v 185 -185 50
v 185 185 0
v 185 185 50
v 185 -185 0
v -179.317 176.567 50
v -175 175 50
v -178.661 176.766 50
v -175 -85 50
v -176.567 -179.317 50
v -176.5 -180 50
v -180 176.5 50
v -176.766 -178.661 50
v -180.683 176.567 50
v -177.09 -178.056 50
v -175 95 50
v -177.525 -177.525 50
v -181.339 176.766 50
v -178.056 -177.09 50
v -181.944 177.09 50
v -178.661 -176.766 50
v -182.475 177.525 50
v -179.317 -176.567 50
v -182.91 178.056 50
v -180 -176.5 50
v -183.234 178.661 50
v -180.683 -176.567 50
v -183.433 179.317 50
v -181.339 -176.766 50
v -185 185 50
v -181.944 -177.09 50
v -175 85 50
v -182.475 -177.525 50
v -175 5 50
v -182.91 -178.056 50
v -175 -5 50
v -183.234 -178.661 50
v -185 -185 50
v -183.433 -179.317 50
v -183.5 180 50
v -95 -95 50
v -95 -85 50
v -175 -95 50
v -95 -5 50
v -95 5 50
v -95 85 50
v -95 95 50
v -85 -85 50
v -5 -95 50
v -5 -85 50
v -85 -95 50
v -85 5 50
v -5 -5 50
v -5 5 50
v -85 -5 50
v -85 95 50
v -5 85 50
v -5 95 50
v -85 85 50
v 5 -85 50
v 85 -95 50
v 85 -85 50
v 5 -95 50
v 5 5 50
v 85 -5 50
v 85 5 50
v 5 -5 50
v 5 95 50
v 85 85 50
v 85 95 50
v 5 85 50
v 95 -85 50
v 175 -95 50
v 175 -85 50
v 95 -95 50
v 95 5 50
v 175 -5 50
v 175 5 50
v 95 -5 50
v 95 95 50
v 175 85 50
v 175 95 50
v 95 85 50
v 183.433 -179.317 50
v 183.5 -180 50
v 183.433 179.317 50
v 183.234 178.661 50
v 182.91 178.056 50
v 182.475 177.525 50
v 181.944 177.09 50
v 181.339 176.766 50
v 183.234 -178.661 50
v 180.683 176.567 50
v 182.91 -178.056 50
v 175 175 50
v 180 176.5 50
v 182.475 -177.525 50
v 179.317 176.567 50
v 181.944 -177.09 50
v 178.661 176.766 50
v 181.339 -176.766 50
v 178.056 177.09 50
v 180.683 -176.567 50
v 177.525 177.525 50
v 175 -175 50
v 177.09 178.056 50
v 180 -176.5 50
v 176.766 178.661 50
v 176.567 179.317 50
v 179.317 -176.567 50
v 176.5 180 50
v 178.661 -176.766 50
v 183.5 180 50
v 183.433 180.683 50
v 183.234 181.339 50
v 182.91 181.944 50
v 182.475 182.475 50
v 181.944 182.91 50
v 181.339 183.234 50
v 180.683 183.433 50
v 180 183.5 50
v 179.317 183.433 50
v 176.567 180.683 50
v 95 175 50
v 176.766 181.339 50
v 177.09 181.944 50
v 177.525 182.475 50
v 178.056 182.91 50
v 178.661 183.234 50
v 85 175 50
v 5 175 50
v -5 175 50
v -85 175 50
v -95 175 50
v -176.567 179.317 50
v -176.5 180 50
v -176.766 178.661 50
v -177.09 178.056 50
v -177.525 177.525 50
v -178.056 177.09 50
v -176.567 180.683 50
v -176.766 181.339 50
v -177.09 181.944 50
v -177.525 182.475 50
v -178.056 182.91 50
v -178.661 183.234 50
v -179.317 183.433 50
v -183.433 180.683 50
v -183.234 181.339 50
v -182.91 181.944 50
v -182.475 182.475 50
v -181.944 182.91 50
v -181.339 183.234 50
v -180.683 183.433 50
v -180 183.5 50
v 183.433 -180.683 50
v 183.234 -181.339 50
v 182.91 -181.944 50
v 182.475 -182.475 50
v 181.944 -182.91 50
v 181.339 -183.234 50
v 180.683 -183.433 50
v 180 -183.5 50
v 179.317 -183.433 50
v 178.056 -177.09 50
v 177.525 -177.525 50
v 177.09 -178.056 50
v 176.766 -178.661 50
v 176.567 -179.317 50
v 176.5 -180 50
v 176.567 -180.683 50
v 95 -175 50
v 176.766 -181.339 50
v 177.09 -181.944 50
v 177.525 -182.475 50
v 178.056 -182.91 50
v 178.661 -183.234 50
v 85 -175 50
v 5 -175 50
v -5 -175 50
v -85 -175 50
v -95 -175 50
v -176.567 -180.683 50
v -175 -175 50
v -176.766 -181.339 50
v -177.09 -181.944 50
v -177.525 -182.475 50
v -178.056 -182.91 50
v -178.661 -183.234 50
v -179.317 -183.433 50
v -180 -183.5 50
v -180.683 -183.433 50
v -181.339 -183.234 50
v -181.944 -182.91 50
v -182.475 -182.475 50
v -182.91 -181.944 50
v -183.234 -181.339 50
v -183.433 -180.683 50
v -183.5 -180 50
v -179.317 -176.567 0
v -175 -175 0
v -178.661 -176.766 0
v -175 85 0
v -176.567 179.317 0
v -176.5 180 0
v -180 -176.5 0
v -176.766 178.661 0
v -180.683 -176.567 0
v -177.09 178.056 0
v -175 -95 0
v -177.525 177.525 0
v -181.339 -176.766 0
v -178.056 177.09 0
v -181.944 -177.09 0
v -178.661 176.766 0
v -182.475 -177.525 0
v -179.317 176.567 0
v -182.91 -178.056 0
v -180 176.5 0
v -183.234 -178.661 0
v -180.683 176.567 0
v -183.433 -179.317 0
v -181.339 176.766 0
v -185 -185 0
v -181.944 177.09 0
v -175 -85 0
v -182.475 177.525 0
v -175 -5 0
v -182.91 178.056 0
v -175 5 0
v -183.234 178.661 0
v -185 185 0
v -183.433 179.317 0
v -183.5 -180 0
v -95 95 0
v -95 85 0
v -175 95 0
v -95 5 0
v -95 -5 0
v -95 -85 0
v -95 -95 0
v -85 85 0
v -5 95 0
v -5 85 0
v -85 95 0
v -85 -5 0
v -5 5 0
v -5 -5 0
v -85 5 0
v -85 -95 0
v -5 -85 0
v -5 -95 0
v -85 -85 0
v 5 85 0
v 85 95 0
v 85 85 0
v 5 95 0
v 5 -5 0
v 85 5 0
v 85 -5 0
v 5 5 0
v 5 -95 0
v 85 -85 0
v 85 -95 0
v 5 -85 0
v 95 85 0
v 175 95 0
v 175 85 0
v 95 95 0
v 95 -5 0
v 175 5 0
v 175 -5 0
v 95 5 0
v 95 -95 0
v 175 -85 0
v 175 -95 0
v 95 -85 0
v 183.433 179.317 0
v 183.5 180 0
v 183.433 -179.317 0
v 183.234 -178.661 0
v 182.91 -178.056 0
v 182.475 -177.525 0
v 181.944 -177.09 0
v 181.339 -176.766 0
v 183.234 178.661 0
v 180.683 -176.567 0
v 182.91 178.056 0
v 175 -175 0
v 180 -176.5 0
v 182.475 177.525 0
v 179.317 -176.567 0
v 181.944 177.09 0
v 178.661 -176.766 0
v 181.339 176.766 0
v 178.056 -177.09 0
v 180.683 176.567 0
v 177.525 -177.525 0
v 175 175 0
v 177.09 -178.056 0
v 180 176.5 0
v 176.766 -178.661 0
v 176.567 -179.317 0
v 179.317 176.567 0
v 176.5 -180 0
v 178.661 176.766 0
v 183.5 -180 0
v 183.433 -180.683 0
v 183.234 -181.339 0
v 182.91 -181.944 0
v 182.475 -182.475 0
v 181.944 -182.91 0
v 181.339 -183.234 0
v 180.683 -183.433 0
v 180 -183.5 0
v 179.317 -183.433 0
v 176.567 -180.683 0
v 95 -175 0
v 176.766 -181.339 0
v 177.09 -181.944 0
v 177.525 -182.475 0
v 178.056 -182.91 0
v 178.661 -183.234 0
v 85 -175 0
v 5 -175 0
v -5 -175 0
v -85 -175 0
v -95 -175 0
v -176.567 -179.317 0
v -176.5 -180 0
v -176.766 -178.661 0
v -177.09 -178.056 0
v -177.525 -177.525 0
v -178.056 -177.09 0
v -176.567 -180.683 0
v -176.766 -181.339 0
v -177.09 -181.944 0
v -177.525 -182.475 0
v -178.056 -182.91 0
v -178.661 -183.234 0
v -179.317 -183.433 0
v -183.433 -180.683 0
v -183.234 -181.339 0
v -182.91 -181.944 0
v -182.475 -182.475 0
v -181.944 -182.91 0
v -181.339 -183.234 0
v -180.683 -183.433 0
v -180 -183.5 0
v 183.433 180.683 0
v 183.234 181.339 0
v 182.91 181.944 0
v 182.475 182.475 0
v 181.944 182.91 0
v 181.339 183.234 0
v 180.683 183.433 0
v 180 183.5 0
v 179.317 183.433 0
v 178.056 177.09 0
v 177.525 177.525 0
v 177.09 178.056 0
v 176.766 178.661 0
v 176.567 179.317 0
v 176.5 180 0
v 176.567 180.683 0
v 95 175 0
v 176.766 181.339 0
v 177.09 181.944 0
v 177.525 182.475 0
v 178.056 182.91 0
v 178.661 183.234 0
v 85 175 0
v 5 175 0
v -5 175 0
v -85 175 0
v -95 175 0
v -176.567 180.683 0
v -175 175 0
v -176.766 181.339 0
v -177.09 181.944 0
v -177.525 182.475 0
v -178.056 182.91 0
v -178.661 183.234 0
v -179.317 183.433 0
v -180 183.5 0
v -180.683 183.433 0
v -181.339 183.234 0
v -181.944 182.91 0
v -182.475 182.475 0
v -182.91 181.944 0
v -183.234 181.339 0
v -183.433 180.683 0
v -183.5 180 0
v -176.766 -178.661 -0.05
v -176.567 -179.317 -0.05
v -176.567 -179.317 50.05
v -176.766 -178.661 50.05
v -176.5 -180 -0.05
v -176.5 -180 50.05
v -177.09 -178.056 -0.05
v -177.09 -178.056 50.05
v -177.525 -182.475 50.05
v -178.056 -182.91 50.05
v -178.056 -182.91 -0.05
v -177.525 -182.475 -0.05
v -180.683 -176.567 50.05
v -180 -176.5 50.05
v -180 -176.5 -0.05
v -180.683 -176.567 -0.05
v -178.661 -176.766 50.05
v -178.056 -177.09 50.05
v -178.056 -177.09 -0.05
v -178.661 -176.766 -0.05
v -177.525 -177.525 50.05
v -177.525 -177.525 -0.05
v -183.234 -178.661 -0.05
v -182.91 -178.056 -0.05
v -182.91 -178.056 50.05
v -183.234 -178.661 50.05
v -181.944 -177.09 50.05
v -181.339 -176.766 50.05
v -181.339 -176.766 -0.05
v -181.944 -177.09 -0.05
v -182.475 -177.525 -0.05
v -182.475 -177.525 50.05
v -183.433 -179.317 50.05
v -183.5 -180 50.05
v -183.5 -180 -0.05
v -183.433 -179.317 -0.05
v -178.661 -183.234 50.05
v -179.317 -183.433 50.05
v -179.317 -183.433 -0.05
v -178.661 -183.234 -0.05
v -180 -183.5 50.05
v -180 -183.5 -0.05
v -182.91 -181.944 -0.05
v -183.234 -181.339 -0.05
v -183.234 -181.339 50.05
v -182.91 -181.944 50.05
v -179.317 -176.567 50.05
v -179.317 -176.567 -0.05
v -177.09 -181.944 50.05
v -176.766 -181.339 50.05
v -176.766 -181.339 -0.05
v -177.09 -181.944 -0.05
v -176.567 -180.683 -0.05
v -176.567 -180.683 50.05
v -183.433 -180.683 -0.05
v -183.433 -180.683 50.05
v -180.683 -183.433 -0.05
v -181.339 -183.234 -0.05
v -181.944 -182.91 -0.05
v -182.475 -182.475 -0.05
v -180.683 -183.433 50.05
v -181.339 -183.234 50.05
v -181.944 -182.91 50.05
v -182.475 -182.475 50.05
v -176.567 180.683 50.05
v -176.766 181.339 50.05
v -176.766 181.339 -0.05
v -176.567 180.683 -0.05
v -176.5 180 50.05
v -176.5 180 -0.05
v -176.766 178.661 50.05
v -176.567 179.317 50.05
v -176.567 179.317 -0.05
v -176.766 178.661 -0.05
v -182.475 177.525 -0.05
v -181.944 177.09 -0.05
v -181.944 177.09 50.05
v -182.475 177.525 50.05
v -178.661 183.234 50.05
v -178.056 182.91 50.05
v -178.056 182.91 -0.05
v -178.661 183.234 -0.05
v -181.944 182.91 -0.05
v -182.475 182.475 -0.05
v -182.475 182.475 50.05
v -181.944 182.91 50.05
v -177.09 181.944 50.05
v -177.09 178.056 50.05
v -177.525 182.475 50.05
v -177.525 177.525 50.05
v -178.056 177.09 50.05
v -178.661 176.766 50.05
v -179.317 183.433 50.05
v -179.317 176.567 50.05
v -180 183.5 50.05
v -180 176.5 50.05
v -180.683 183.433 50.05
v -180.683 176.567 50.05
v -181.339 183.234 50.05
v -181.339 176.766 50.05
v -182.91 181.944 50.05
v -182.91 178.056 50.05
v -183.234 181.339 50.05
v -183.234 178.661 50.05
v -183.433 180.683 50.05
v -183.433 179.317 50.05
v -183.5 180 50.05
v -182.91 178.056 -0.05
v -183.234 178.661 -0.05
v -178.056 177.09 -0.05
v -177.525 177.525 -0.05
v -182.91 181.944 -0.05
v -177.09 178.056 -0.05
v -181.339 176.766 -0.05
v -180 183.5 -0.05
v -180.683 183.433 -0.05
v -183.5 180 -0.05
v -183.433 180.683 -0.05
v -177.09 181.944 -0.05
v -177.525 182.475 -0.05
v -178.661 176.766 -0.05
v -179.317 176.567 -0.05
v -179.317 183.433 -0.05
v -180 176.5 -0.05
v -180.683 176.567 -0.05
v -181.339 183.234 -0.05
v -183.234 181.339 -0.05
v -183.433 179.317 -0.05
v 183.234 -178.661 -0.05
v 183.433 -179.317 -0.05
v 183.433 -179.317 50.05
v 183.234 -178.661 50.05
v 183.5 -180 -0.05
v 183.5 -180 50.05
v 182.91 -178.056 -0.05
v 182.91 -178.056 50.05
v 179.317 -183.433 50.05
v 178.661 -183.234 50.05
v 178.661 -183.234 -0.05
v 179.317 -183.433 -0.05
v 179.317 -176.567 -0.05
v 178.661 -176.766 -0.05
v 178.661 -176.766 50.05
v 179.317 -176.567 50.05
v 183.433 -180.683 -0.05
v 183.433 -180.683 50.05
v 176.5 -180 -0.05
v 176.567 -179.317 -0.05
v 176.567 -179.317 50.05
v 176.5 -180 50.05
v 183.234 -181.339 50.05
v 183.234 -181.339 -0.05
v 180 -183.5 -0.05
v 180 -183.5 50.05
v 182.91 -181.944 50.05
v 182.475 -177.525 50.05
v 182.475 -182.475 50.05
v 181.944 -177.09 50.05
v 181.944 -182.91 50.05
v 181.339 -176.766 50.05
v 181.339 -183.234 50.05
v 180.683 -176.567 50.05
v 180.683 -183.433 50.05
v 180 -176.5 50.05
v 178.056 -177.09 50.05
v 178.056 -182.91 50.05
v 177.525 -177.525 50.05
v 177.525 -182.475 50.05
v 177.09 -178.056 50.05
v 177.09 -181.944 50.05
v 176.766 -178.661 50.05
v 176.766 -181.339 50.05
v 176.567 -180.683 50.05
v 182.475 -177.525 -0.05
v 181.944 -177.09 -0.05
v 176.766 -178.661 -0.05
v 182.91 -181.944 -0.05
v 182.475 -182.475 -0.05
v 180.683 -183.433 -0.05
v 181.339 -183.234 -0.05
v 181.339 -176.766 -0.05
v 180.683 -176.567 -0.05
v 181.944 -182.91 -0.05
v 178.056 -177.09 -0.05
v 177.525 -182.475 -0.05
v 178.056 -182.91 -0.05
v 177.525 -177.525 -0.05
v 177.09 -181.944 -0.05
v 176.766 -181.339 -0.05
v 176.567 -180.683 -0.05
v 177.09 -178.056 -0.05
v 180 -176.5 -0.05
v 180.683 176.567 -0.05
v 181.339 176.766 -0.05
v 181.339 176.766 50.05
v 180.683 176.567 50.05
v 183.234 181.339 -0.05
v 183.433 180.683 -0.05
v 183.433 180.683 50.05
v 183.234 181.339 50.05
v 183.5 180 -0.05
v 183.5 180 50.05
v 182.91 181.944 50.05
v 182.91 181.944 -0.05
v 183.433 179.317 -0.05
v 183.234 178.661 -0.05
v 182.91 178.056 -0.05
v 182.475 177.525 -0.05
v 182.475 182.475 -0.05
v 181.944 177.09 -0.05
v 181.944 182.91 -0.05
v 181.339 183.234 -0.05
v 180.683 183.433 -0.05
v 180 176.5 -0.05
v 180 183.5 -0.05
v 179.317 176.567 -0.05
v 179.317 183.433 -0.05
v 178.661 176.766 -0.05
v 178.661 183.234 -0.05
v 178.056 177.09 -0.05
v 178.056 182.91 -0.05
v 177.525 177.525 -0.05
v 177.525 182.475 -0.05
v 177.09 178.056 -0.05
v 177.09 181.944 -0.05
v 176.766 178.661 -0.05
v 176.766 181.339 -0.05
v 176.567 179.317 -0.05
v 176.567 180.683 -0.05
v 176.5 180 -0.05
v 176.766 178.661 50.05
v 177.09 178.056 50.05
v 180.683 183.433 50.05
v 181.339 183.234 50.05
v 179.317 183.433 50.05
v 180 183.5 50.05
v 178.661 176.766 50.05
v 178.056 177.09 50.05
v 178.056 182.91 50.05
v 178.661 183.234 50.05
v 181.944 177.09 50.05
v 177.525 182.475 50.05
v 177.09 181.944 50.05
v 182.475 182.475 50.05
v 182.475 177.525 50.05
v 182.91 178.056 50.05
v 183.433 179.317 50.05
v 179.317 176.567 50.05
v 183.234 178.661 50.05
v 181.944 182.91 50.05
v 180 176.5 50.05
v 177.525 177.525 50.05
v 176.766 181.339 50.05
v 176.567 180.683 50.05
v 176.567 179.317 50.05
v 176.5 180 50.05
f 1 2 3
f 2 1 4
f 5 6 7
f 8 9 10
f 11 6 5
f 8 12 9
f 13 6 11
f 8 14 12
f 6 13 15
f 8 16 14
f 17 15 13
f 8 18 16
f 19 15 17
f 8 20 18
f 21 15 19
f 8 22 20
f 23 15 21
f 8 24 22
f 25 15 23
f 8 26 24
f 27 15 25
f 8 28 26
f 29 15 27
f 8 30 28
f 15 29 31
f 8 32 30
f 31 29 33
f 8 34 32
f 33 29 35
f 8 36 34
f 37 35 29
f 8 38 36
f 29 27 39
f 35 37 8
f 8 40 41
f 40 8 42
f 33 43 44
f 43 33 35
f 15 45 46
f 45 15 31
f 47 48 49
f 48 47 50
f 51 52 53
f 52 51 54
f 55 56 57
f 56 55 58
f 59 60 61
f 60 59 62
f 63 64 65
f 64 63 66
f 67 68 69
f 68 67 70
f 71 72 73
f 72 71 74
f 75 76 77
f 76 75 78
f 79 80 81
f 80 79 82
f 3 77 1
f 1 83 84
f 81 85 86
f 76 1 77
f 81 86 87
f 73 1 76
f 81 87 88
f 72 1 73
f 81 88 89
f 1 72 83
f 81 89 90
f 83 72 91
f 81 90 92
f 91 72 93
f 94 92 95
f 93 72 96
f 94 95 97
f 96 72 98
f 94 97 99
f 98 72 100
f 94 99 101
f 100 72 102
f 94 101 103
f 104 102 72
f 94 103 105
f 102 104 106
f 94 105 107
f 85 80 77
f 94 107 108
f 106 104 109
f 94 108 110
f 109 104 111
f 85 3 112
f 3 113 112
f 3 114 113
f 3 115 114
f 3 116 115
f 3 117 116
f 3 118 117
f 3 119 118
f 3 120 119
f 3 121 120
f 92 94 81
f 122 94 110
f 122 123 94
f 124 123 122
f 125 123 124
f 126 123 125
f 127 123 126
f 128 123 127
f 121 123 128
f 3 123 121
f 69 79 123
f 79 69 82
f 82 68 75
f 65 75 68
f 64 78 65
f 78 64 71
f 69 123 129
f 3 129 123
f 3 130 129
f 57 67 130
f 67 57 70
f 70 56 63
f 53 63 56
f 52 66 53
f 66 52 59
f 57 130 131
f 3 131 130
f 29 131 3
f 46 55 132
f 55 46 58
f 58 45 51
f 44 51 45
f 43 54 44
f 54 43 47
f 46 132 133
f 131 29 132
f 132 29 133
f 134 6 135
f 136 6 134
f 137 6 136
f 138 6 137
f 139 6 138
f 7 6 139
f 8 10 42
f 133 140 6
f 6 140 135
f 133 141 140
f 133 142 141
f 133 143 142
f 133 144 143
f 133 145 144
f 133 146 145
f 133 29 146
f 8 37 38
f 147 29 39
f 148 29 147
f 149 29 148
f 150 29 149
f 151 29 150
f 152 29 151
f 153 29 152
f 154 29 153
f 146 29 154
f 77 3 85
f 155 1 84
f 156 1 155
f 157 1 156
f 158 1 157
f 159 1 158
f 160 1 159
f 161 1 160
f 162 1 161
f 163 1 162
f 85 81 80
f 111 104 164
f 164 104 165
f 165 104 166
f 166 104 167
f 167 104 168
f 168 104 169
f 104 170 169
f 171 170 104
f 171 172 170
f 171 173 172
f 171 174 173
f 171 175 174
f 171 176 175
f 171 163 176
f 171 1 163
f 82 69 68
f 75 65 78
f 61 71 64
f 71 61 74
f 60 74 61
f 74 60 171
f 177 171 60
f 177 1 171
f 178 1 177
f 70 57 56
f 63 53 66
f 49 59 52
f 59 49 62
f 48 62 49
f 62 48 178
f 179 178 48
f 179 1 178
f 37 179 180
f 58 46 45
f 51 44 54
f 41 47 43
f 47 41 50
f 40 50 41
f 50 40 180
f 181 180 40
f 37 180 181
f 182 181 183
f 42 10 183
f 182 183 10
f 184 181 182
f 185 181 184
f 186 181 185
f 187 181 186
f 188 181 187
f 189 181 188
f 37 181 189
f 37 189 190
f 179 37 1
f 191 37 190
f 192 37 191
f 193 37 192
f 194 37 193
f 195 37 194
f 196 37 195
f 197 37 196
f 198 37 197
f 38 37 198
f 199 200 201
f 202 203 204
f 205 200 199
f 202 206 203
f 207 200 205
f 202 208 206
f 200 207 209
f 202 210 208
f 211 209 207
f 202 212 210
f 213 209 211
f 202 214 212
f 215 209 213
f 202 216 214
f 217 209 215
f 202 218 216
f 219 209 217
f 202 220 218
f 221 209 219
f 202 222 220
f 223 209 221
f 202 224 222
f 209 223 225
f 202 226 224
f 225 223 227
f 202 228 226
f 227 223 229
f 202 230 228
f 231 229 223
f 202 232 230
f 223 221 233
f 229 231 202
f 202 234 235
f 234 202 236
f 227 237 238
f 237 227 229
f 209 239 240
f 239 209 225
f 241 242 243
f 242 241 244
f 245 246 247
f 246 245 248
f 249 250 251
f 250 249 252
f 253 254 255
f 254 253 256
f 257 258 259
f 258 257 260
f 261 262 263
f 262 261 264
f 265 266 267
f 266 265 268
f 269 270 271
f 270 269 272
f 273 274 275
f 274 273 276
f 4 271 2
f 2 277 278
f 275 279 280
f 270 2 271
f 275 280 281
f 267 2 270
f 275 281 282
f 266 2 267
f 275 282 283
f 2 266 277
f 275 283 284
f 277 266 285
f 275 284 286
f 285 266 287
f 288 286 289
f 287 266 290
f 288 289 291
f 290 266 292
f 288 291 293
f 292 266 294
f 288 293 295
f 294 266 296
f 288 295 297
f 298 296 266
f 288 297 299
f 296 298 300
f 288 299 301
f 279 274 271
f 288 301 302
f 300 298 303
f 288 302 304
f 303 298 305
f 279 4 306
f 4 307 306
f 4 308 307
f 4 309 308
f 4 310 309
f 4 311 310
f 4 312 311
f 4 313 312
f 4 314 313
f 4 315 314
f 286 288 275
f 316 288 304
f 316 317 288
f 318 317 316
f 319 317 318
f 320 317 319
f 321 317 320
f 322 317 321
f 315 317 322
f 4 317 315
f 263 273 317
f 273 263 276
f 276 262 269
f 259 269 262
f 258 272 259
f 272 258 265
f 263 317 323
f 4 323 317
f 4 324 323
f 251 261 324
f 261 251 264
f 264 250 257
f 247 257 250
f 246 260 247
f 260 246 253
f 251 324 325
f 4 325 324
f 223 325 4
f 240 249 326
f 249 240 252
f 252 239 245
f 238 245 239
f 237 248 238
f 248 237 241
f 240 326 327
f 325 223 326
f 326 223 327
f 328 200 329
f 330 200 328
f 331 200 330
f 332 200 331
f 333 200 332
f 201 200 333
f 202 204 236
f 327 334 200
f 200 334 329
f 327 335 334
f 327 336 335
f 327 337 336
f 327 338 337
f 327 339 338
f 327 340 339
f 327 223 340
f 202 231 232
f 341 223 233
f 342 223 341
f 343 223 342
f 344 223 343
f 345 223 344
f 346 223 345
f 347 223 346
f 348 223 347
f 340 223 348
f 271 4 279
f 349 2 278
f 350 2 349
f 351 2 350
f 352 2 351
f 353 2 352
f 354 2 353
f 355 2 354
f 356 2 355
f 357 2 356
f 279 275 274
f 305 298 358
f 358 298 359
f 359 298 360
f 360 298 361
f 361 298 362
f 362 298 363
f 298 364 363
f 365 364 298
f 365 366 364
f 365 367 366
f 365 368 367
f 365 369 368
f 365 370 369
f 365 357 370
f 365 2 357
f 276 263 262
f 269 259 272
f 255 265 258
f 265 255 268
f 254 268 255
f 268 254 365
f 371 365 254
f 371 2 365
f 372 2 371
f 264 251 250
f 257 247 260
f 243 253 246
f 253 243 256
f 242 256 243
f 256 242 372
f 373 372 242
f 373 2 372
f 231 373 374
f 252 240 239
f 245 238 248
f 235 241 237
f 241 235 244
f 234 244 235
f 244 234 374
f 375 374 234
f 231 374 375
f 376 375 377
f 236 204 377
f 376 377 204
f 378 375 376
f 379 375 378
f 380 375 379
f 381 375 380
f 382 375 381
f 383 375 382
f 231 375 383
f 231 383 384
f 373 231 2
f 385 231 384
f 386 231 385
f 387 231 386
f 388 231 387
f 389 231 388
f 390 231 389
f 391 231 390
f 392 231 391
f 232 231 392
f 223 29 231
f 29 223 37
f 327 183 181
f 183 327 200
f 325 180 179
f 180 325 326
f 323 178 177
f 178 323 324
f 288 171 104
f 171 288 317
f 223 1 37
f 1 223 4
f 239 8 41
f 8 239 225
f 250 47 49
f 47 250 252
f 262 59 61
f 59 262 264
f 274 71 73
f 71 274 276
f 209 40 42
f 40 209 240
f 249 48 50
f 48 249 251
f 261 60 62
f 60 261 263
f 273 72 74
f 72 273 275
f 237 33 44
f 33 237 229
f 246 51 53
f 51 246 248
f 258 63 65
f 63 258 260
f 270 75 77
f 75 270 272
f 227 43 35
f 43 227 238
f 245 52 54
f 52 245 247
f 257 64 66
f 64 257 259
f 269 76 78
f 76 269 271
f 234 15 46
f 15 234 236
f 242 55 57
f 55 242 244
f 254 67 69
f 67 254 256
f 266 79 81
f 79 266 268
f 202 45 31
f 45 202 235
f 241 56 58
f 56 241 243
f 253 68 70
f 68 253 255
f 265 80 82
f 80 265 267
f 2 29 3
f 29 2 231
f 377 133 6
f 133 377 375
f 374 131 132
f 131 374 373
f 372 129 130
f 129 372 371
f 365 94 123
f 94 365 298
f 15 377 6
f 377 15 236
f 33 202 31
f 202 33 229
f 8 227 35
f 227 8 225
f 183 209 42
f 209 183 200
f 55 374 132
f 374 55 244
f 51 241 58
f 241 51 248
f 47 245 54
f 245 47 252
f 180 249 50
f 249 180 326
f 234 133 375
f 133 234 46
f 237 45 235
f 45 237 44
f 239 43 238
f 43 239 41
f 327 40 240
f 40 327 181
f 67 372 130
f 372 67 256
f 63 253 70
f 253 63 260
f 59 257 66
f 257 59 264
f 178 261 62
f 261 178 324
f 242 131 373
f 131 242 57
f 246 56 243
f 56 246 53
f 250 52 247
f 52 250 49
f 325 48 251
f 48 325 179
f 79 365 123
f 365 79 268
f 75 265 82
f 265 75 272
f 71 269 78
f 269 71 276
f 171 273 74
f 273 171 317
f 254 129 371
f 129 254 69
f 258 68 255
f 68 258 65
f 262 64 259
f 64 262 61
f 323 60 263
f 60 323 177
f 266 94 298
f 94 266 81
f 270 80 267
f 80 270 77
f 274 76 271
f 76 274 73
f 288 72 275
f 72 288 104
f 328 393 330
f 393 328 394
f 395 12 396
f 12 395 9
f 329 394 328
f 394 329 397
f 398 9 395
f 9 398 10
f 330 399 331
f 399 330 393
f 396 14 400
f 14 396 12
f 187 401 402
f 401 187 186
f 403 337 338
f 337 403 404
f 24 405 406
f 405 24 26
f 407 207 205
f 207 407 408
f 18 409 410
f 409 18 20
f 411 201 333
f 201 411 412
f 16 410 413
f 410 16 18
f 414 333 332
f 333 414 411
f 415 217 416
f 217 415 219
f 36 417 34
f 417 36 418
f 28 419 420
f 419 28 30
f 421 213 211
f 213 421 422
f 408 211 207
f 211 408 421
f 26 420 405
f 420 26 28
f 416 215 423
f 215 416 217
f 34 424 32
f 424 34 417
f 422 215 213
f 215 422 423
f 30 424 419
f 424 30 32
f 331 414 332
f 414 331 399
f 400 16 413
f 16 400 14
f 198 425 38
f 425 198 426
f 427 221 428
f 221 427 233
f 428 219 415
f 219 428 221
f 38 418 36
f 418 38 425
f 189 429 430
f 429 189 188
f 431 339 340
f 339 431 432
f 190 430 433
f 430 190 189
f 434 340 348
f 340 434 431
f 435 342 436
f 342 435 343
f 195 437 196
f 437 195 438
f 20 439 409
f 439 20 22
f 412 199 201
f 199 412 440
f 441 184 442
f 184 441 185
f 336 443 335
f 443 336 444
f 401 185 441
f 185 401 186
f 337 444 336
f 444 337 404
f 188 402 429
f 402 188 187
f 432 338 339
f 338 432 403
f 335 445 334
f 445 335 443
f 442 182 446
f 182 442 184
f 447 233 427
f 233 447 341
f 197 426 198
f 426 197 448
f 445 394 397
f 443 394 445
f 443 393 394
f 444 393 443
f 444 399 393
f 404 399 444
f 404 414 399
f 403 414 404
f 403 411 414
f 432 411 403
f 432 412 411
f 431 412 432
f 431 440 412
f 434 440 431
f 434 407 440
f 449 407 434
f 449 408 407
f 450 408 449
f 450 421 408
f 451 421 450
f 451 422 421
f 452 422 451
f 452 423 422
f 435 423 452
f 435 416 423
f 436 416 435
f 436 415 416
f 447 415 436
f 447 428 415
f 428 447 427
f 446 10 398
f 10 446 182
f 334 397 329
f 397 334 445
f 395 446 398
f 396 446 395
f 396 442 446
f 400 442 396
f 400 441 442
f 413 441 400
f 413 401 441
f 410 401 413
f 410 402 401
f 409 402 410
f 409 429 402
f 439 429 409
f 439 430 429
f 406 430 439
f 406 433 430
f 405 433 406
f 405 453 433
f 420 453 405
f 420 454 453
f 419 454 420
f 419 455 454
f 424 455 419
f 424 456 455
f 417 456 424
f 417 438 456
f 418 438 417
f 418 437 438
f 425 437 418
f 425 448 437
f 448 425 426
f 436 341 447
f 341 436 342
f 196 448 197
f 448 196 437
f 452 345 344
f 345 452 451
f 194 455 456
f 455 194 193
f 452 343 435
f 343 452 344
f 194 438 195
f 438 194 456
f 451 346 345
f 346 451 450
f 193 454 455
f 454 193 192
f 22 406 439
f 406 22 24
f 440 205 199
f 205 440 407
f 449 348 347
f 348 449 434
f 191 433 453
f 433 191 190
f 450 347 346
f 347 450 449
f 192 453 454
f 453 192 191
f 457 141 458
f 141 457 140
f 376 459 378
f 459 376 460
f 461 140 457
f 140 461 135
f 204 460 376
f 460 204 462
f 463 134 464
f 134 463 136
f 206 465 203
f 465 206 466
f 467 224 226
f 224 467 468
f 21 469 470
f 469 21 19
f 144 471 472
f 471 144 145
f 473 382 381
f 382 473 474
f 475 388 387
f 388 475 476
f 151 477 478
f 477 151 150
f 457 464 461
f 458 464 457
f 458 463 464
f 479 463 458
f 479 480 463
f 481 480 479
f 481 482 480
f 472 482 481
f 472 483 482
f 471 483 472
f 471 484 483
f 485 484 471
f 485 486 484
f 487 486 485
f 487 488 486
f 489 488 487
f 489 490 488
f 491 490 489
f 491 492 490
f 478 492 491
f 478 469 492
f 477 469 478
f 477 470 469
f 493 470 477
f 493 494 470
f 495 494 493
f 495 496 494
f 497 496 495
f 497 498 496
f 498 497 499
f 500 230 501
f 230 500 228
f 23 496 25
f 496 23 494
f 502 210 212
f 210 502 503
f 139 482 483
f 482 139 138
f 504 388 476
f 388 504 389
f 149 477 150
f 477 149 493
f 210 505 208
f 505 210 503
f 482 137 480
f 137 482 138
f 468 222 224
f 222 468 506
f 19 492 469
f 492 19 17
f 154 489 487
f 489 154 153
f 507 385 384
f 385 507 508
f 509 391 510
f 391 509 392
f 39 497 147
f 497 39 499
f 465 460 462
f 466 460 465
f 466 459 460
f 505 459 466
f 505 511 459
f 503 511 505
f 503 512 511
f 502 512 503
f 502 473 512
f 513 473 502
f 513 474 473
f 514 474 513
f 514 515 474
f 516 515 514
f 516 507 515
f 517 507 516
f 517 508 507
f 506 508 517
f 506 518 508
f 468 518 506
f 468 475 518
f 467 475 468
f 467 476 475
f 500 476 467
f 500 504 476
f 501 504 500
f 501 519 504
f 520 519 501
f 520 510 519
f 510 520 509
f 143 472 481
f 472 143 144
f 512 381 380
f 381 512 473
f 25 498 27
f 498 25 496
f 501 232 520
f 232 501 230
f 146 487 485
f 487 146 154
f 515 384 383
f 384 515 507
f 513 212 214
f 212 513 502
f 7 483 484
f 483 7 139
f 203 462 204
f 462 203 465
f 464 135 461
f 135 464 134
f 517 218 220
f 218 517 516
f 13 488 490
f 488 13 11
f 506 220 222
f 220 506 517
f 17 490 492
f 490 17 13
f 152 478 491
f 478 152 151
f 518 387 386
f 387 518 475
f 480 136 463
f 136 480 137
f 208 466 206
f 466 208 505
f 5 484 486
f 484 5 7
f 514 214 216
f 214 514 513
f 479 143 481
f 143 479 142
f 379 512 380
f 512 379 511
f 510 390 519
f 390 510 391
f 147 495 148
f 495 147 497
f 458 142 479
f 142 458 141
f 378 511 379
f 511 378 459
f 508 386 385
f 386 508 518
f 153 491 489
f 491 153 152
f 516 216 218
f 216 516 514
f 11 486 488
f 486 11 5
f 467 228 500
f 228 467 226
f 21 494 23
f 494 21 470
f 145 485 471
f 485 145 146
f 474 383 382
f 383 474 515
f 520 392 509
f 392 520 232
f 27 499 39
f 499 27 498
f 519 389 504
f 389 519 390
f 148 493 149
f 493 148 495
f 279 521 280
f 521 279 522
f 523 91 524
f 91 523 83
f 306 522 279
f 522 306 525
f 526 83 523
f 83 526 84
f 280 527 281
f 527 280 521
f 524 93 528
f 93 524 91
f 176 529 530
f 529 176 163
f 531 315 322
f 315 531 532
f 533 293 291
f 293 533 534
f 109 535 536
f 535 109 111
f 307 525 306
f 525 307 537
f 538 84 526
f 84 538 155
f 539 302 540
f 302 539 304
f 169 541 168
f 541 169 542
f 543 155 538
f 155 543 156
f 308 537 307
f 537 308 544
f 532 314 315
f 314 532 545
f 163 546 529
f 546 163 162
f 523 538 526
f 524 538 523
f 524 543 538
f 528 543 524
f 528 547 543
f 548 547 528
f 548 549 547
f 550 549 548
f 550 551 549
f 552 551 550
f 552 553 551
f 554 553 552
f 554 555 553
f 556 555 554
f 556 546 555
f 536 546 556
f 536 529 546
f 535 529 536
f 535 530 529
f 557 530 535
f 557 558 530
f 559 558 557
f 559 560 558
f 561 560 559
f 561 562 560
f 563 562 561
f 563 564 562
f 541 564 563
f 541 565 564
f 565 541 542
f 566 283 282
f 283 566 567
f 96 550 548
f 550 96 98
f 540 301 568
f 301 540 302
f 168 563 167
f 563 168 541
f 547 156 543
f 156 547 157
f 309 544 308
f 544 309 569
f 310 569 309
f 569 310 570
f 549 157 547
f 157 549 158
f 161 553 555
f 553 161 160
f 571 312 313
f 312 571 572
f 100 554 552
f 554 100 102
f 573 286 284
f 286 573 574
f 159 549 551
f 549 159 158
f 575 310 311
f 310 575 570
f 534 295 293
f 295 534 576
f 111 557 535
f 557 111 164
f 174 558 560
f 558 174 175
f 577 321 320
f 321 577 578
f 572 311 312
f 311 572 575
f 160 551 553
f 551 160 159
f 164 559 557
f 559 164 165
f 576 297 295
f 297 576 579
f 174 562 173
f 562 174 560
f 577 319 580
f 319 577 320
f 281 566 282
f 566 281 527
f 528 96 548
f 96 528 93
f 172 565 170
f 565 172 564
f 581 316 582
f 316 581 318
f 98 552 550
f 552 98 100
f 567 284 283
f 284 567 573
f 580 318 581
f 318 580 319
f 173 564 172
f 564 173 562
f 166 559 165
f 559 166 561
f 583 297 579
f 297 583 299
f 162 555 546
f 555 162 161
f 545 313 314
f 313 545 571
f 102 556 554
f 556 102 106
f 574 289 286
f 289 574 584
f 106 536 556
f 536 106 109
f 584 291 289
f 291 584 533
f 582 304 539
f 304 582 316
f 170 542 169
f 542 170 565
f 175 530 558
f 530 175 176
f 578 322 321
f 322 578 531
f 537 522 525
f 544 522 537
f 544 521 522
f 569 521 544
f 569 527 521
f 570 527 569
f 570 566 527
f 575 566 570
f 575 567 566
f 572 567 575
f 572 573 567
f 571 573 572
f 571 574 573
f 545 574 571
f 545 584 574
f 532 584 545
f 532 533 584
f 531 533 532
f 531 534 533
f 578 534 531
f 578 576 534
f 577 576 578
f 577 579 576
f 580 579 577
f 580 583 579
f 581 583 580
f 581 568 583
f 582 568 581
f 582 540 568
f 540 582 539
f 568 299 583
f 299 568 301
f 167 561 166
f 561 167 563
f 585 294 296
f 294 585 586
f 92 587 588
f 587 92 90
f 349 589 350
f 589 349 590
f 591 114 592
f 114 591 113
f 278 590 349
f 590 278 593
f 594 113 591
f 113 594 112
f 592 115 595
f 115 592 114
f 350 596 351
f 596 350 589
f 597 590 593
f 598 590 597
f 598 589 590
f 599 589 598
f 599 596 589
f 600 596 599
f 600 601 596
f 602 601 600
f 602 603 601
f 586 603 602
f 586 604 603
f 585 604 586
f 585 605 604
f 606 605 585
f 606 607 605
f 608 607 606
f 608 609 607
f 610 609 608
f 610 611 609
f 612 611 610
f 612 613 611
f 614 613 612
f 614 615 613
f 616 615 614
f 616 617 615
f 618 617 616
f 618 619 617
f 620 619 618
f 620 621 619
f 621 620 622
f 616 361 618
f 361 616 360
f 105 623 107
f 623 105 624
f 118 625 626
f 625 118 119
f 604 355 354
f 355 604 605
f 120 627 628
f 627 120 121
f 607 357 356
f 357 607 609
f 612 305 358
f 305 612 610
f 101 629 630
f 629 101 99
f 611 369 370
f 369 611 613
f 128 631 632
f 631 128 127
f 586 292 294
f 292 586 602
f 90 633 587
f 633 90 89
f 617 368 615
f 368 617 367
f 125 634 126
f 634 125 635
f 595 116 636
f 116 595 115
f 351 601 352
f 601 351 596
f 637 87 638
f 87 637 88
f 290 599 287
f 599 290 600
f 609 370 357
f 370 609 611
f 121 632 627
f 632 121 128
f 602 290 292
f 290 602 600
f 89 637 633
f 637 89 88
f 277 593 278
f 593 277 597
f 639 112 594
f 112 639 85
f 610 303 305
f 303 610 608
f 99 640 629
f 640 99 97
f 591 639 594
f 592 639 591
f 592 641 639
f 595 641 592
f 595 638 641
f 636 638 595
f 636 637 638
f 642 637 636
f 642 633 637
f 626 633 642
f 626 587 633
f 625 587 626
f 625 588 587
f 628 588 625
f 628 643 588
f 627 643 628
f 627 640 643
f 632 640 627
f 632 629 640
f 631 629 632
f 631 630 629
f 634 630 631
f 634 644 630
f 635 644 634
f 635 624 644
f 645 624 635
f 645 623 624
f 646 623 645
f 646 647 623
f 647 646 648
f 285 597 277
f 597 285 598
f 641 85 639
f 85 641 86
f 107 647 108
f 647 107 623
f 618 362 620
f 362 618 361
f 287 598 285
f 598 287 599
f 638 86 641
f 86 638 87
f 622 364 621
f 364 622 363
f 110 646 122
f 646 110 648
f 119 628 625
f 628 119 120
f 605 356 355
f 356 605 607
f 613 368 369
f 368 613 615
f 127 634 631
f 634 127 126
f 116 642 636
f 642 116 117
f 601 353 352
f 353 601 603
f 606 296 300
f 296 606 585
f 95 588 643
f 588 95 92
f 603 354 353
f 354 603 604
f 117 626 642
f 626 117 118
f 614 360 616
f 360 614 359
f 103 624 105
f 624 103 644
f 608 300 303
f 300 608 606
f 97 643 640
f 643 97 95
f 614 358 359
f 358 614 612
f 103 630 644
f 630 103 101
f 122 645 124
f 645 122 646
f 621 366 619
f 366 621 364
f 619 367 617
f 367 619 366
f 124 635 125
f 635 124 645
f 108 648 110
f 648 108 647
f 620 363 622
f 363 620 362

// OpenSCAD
// Part Name: Cage_Layer_0_H50mm
// This part represents a horizontal slice of the cage.
// It is designed to be 3D printed on its base.

// Parameters for the cage
bar_t = 10;
gap_xy = 80;
hole_d = 7;
cage_ext_xy = 370;

// Calculate bar center positions relative to the overall cage center
bar_centers_xy = [for (j = [0:4]) (-cage_ext_xy/2 + bar_t/2 + j * (bar_t + gap_xy))];

// Module to generate a single layer segment
module cage_layer_segment(height) {
    // Offset for printing on z=0 plane. The module itself is centered on XY=0, so this Z offset moves its base to Z=0.
    translate([0, 0, height/2]) {
        union() {
            // Horizontal bars (along X)
            for (y_center = bar_centers_xy) {
                translate([0, y_center, 0])
                cube([cage_ext_xy, bar_t, height], center = true);
            }

            // Vertical bars (along Y)
            for (x_center = bar_centers_xy) {
                translate([x_center, 0, 0])
                cube([bar_t, cage_ext_xy, height], center = true);
            }

            // Subtract holes for M6 rods at the 4 corners
            corner_offsets_xy = [bar_centers_xy[0], bar_centers_xy[4]];

            for (x_offset = corner_offsets_xy) {
                for (y_offset = corner_offsets_xy) {
                    // Hole through the center of the corner bar
                    translate([x_offset, y_offset, 0])
                    cylinder(h = height + 0.1, d = hole_d, center = true, $fn=32); // +0.1 for clean cut
                }
            }
        }
    }
}

// Render the segment
cage_layer_segment(50);
